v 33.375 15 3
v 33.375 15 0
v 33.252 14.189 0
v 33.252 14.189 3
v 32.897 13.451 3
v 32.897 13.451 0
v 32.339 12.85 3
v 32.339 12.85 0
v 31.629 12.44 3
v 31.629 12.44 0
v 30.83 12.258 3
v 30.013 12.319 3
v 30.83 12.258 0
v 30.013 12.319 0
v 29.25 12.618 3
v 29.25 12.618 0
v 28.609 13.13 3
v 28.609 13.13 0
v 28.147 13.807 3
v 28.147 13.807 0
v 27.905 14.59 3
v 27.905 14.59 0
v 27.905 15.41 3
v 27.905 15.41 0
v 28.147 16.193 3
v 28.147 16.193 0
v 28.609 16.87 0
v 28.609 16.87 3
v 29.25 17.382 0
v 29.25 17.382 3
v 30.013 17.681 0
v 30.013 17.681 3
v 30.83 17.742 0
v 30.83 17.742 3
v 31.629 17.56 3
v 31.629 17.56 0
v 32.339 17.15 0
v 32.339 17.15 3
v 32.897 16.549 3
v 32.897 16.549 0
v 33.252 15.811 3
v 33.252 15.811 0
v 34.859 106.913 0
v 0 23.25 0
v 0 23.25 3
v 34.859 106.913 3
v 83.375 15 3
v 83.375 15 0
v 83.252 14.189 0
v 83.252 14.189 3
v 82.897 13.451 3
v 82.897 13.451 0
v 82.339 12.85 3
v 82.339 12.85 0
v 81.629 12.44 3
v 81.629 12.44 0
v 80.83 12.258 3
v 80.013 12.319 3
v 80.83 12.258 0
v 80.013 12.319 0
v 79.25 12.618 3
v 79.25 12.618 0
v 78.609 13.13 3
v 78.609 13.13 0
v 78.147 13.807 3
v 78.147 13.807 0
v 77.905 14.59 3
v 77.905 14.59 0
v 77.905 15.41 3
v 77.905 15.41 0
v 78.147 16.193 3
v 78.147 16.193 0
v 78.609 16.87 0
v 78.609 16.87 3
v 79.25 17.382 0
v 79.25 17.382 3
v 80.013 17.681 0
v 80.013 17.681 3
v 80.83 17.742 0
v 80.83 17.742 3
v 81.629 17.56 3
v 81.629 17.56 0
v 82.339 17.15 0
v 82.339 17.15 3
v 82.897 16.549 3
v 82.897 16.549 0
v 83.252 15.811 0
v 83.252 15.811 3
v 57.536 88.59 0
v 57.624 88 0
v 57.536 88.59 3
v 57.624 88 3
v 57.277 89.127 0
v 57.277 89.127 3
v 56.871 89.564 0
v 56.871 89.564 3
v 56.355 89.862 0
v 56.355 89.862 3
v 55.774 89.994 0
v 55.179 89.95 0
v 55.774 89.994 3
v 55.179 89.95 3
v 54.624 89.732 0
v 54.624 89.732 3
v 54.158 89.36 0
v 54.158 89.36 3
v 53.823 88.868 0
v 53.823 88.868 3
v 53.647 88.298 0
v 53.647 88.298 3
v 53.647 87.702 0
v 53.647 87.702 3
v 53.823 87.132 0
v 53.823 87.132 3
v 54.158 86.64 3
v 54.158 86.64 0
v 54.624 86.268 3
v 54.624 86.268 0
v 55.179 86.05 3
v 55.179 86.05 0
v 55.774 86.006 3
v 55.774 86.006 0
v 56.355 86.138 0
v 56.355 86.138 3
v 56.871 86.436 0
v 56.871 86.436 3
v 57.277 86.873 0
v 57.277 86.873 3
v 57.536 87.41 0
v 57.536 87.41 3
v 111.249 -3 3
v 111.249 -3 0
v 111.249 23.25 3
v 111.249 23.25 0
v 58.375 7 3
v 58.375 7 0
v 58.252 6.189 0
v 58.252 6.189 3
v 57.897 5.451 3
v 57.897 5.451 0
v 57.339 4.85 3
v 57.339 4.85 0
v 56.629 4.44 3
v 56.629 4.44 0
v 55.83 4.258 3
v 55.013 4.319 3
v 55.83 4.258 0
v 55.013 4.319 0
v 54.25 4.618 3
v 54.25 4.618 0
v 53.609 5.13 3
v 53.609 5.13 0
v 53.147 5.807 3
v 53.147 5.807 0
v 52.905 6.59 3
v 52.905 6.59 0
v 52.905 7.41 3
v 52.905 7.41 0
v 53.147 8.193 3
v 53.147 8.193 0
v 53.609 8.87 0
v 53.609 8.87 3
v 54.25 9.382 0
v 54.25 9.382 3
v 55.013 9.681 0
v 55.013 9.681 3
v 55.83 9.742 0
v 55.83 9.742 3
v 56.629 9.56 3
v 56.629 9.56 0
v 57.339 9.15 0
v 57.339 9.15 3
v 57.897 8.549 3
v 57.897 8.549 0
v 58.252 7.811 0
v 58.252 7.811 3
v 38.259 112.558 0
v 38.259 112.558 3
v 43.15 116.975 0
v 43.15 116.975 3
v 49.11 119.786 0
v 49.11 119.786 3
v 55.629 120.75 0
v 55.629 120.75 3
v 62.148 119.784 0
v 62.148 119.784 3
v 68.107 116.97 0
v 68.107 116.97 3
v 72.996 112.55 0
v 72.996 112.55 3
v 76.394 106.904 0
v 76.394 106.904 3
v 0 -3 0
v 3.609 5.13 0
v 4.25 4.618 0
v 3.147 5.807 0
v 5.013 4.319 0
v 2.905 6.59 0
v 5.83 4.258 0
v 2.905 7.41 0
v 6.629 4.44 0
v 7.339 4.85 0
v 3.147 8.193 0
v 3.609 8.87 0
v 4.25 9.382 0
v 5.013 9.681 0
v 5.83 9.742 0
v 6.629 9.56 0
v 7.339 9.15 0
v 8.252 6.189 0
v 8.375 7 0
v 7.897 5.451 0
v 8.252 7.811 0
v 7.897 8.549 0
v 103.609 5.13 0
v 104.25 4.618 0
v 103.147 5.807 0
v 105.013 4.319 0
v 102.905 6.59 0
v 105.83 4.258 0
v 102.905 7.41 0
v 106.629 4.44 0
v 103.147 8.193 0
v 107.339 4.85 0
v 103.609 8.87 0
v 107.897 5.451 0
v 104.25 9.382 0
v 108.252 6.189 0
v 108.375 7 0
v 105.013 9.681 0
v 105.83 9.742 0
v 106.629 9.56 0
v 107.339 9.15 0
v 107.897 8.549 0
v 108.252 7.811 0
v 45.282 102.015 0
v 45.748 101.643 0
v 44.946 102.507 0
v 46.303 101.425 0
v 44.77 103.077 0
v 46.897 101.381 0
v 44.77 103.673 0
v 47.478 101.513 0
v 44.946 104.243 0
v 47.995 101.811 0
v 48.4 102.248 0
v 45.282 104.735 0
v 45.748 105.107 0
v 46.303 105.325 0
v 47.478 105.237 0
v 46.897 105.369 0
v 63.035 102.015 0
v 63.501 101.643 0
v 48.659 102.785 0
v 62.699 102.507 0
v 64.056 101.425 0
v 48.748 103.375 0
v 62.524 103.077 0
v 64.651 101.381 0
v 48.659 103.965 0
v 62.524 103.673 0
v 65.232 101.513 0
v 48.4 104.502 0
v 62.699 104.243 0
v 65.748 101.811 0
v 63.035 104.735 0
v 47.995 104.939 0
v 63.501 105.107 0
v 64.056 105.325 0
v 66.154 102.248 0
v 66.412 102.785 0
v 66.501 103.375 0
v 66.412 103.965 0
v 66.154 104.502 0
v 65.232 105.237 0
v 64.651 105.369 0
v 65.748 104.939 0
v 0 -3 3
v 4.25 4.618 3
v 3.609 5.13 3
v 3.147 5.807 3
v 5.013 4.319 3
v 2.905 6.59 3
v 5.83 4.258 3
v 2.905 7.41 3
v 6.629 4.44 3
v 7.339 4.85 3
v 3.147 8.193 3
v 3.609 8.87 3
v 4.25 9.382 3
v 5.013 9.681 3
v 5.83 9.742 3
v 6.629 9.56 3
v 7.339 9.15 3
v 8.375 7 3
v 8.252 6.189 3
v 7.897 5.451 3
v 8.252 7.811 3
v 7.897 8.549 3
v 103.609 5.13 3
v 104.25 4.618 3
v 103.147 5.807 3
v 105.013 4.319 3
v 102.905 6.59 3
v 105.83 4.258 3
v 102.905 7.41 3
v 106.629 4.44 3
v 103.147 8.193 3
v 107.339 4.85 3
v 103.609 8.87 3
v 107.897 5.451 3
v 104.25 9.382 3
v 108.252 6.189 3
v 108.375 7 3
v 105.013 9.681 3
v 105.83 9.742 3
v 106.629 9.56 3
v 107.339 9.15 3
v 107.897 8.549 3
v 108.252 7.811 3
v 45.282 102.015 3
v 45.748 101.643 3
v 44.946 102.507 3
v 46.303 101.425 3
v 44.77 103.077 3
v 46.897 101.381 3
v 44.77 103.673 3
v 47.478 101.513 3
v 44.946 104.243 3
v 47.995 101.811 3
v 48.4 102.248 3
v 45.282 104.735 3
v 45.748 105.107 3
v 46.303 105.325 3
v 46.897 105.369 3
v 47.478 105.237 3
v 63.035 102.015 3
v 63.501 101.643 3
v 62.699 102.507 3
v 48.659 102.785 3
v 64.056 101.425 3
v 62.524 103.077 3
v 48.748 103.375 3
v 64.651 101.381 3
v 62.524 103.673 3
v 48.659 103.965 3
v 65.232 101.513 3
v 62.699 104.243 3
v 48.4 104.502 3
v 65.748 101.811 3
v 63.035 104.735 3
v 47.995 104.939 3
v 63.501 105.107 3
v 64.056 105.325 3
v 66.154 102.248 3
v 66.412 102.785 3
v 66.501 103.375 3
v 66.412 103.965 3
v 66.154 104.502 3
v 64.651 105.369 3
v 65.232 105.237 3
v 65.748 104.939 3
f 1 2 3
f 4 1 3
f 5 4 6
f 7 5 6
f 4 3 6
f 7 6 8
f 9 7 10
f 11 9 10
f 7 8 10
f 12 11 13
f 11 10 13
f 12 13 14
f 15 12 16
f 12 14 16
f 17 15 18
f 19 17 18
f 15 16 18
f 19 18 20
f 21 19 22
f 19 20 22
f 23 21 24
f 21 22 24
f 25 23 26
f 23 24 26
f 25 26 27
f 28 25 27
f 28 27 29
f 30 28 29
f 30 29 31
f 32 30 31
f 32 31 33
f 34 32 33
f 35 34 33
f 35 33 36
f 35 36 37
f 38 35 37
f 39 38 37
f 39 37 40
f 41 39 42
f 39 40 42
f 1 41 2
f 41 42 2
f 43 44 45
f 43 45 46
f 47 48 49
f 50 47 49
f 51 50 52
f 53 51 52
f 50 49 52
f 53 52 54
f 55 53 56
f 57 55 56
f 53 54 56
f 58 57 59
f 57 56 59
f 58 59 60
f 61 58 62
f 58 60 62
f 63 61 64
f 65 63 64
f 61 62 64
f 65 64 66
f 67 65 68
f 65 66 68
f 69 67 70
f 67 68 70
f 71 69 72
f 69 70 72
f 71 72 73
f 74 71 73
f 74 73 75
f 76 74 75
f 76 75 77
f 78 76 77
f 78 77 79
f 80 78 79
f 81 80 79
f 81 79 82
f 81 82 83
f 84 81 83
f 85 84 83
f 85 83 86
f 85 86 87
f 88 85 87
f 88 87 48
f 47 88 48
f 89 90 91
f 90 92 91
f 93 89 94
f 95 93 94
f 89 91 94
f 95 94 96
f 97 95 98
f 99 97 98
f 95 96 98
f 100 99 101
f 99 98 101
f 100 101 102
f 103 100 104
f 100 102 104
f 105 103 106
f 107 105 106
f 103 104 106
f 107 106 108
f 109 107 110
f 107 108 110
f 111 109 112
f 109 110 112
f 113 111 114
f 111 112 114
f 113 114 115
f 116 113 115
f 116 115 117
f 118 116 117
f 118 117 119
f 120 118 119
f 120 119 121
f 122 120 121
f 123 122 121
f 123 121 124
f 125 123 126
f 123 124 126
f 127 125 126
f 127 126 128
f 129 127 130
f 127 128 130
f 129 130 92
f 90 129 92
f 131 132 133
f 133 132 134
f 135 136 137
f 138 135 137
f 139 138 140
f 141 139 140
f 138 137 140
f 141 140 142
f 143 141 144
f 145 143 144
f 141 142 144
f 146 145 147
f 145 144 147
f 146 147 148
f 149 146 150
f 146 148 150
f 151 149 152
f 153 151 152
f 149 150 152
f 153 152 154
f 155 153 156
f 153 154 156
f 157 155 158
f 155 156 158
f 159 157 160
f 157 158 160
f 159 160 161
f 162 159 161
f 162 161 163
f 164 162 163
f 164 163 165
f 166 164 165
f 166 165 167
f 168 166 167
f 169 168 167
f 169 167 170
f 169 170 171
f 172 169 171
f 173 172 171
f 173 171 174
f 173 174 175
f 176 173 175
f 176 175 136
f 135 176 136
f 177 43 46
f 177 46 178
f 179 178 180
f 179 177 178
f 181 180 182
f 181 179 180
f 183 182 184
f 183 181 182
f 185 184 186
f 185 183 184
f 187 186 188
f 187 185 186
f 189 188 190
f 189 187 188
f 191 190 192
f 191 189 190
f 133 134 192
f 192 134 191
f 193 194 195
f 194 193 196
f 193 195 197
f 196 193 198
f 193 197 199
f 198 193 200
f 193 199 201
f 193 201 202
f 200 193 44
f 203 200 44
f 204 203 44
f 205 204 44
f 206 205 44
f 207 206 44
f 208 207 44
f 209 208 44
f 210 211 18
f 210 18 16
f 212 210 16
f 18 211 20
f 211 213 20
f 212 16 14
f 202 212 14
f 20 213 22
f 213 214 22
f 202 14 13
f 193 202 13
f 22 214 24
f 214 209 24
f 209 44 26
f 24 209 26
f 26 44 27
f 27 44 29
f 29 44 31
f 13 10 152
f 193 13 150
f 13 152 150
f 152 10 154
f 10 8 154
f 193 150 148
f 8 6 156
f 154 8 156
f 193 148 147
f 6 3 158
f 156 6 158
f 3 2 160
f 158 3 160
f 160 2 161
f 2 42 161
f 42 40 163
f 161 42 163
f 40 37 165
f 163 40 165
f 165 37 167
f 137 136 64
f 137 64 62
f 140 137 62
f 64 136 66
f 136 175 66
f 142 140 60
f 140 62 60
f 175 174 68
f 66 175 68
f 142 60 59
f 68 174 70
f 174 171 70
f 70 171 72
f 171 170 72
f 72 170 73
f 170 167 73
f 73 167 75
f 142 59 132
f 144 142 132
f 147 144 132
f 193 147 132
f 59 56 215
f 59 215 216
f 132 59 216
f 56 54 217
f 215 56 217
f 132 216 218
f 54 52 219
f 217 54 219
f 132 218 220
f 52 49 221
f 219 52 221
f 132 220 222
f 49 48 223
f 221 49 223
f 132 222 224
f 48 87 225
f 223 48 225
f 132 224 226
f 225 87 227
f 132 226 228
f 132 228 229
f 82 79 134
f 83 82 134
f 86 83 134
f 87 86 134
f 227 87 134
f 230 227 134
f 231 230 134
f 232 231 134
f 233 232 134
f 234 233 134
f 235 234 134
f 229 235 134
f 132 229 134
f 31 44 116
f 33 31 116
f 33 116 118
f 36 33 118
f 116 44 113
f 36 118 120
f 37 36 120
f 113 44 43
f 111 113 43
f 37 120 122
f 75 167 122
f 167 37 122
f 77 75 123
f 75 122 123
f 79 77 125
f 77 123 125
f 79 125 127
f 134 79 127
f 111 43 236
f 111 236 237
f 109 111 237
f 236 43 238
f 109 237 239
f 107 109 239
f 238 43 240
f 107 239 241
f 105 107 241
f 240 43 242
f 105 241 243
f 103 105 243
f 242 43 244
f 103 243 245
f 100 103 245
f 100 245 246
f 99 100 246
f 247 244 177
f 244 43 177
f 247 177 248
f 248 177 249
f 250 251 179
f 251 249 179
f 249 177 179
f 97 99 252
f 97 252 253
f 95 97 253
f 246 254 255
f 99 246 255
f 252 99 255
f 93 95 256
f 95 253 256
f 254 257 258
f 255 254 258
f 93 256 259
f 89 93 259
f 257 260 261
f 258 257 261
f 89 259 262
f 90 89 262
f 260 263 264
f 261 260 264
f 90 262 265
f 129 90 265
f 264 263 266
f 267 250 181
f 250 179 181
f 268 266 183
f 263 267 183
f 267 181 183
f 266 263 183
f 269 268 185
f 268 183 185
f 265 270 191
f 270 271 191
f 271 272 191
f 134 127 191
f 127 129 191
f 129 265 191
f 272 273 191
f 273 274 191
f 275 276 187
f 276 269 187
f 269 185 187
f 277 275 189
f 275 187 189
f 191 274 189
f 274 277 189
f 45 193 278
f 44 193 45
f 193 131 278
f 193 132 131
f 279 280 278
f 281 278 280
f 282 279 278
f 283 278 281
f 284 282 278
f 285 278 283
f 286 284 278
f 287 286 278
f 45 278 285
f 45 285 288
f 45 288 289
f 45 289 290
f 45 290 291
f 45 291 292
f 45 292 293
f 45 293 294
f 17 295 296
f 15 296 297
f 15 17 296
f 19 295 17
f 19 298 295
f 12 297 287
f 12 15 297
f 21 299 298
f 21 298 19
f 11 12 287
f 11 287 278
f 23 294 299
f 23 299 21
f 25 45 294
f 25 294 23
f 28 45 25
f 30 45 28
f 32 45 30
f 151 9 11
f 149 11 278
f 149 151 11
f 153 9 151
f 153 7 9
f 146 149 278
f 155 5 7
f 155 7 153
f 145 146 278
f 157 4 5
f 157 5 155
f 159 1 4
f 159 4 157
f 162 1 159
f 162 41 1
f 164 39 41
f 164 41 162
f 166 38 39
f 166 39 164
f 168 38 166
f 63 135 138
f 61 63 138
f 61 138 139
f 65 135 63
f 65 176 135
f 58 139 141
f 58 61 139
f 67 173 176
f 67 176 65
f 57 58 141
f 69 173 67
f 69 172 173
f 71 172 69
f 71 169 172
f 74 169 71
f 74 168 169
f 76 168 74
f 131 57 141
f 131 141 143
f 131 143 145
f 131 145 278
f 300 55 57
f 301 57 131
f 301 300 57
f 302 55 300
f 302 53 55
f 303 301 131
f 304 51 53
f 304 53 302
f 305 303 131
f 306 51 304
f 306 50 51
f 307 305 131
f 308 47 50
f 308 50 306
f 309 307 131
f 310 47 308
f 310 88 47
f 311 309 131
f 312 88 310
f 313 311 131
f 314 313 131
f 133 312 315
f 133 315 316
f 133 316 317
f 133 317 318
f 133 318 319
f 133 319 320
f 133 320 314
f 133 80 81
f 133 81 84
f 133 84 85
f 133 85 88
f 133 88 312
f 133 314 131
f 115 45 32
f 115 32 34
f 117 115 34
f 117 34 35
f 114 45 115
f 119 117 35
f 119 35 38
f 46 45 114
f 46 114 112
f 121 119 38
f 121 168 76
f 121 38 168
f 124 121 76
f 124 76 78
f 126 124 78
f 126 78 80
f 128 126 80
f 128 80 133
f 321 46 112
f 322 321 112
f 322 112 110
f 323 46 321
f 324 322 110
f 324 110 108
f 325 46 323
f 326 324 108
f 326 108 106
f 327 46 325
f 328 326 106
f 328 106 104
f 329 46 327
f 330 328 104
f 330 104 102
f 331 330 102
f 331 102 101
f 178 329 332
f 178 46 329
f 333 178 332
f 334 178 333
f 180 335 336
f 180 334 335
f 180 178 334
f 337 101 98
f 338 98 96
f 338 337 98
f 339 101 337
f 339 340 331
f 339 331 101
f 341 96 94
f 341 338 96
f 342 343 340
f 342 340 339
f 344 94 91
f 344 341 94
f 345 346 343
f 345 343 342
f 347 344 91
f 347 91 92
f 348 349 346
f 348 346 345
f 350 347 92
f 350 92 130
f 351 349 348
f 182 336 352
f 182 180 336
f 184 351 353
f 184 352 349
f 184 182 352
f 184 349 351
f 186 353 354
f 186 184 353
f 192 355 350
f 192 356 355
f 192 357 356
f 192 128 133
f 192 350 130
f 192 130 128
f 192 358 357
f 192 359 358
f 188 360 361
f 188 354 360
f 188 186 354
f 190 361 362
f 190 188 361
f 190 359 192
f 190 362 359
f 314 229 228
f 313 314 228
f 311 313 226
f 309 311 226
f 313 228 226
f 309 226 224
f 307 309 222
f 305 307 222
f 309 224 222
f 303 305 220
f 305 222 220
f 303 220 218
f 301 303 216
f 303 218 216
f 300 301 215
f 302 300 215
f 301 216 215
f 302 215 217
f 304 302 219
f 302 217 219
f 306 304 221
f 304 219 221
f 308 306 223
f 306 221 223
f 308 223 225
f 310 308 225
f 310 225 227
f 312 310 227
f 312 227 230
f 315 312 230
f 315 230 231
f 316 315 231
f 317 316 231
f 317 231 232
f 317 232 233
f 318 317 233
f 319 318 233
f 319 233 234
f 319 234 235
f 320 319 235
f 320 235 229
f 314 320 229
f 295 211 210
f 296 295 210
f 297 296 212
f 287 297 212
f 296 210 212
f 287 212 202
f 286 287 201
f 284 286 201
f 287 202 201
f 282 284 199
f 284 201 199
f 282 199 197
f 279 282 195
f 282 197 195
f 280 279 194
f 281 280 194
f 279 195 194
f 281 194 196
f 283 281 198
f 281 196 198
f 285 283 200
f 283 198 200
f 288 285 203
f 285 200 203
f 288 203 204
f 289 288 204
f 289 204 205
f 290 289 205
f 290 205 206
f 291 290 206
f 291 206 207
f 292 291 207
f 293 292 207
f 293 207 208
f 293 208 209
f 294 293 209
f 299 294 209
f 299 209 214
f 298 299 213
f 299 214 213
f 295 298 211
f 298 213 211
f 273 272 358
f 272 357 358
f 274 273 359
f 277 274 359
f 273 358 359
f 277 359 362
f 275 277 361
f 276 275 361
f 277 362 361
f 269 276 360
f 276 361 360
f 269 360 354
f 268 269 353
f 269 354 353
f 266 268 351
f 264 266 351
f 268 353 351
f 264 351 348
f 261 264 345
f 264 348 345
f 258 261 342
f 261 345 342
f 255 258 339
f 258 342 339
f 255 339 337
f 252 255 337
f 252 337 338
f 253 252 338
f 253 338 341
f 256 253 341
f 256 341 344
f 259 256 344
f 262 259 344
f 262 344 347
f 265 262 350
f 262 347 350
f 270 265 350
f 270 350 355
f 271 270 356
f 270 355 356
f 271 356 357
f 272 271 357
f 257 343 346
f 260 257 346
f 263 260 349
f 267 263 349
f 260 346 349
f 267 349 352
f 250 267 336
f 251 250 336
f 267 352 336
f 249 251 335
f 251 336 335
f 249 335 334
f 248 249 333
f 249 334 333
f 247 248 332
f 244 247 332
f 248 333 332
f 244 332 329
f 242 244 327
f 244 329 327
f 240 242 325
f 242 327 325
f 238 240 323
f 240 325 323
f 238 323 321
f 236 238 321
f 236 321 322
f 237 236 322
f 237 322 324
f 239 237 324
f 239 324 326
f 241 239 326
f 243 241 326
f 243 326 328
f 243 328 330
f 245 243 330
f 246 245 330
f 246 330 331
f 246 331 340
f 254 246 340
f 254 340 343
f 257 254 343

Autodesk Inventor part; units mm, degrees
ref_plane "YZ Plane" through (0, 0, 0) normal (1, 0, 0) x (0, 1, 0)
ref_plane "XZ Plane" through (0, 0, 0) normal (0, 1, 0) x (-1, 0, 0)
ref_plane "XY Plane" through (0, 0, 0) normal (0, 0, 1) x (1, 0, 0)
sketch "Szkic1" plane through (0, 0, 0) normal (0, 0, 1) x (1, 0, 0)
  circle A0 centre (55.6246, 7) radius 2.75 projected
  circle A1 centre (30.6246, 15) radius 2.75 projected
  circle A2 centre (80.6246, 15) radius 2.75 projected
  circle A3 centre (5.6246, 7) radius 2.75 projected
  circle A4 centre (105.6246, 7) radius 2.75 projected
  line L0 (111.2491, 0) -> (0, 0) projected
  line L1 (111.2491, 0) -> (111.2491, 23.25) projected
  line L2 (0, 23.25) -> (111.2491, 23.25) projected
  line L3 (0, 0) -> (0, 23.25) projected
  line L4 (55.6245, 23.25) -> (55.6245, 98.25)
  circle A5 centre (55.6245, 98.25) radius 22.5
  line L5 (111.2491, 23.25) -> (24.4674, 231.5289)
  line L6 (0, 23.25) -> (68.7685, 188.2966)
  point P0 (76.3938, 106.9037)
  point P1 (34.8553, 106.9037)
  dimension "d0" = 75
  dimension "d1" = 98.25
  dimension "d2" = 45
extrude "Wyciągnięcie proste1" add sketch "Szkic1" along normal blind 3 contours L0 L3 L2 L1 | L2 L4 A5 L5 | L6 A5 L4 L2 | A5
sketch "Szkic2" plane through (0, 0, 3) normal (0, 0, 1) x (1, 0, 0)
  line L0 (34.8553, 106.9037) -> (0, 23.25) projected
  line L1 (0, 23.25) -> (0, 0) projected
  line L2 (0, 0) -> (111.2491, 0) projected
  line L3 (111.2491, 0) -> (111.2491, 23.25) projected
  line L4 (111.2491, 23.25) -> (76.3938, 106.9037) projected
  arc A0 (76.3938, 106.9037) -> (34.8553, 106.9037) centre (55.6245, 98.25) ccw projected
  circle A1 centre (105.6246, 7) radius 2.75 projected
  circle A2 centre (5.6246, 7) radius 2.75 projected
  circle A3 centre (80.6246, 15) radius 2.75 projected
  circle A4 centre (30.6246, 15) radius 2.75 projected
  circle A5 centre (55.6246, 7) radius 2.75 projected
  line L5 (55.6245, 98.25) -> (55.6245, 88)
  circle A6 centre (55.6245, 88) radius 2
  circle A7 centre (64.5013, 103.375) radius 2
  circle A8 centre (46.7478, 103.375) radius 2
  dimension "d5" = 10.25
  dimension "d6" = 4
  dimension "d9" = 360
extrude "Wyciągnięcie proste2" cut sketch "Szkic2" against normal through all contours A6 | A7 | A8
move faces "Przesuń1" translate (0, -3, 0) faces at (37.083, 0, 1)
properties part number "BLACHA_2_Przegub" material "Aluminium 6061"
